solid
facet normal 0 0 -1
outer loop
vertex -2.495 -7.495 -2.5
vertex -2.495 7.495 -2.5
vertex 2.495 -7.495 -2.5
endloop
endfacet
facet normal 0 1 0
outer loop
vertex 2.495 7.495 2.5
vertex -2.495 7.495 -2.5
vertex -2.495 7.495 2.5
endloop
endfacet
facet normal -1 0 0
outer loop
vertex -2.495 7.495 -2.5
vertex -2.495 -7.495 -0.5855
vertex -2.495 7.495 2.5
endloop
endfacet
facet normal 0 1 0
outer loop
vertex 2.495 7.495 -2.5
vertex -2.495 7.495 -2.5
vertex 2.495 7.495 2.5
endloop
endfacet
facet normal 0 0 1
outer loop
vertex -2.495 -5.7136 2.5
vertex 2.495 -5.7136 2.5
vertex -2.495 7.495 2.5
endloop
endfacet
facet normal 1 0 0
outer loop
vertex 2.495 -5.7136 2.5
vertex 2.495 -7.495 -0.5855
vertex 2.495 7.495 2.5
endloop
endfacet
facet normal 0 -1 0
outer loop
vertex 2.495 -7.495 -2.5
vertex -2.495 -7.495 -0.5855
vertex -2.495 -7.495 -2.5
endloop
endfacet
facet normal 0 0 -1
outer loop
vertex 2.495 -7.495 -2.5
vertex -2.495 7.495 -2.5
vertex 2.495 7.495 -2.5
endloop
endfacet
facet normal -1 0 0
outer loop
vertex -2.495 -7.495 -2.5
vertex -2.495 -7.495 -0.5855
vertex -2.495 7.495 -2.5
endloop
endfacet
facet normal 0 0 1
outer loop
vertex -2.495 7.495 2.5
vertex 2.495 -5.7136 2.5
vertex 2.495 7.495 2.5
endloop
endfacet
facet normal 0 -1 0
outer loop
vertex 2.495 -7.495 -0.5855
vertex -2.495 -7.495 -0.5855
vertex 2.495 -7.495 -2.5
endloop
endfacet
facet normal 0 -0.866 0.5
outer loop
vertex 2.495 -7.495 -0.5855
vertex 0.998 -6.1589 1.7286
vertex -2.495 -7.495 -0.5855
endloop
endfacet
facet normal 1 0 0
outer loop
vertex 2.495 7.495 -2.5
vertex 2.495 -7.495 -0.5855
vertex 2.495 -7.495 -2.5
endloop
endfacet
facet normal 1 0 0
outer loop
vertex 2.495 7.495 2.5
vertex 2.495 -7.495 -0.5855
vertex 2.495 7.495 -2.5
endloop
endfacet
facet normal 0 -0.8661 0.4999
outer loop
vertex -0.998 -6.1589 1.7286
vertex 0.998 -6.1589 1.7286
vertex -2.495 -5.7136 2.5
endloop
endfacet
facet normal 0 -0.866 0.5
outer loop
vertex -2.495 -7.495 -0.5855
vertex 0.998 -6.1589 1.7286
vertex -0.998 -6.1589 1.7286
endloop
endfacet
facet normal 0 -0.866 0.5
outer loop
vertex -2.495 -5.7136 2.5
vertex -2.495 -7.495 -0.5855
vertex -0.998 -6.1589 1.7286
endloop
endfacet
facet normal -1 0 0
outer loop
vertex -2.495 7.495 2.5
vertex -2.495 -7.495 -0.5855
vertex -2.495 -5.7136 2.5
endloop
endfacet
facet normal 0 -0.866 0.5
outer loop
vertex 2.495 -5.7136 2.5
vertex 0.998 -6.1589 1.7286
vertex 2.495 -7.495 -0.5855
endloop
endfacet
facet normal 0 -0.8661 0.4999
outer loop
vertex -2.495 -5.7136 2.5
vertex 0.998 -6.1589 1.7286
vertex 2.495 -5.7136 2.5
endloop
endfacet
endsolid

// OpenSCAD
use <lib.scad>

bounds = [4.99,14.99,5];

module chassisLD() {
	difference() {
		box(bounds);
		translate([0,-y(bounds)/1.2,z(bounds)*1.15]) rotate([-30,0,0]) box([x(bounds)*1.1, y(bounds), z(bounds)*1.5]);
		translate([0,-y(bounds)/3.5,0]) difference() {
			rotate([90,0,0]) cyl(x(bounds)/2.5, x(bounds)/2.5, y(bounds)/2.2, $fn=24);
			translate([0,-y(bounds)/1.5,-z(bounds)/2]) box(bounds);
		}
		translate([0,-y(bounds)*0.471,-1]) scale([1.5,1,1]) rotate([-60,0,0]) rotate([0,0,45]) cyl(0.55, 0.15, 1.5, $fn=4);
	}
}

module chassisHD() {
	minkowskiOutsideRound(0.01,$fn=8) chassisLD();
}

//chassisHD();
hull() chassisLD();
